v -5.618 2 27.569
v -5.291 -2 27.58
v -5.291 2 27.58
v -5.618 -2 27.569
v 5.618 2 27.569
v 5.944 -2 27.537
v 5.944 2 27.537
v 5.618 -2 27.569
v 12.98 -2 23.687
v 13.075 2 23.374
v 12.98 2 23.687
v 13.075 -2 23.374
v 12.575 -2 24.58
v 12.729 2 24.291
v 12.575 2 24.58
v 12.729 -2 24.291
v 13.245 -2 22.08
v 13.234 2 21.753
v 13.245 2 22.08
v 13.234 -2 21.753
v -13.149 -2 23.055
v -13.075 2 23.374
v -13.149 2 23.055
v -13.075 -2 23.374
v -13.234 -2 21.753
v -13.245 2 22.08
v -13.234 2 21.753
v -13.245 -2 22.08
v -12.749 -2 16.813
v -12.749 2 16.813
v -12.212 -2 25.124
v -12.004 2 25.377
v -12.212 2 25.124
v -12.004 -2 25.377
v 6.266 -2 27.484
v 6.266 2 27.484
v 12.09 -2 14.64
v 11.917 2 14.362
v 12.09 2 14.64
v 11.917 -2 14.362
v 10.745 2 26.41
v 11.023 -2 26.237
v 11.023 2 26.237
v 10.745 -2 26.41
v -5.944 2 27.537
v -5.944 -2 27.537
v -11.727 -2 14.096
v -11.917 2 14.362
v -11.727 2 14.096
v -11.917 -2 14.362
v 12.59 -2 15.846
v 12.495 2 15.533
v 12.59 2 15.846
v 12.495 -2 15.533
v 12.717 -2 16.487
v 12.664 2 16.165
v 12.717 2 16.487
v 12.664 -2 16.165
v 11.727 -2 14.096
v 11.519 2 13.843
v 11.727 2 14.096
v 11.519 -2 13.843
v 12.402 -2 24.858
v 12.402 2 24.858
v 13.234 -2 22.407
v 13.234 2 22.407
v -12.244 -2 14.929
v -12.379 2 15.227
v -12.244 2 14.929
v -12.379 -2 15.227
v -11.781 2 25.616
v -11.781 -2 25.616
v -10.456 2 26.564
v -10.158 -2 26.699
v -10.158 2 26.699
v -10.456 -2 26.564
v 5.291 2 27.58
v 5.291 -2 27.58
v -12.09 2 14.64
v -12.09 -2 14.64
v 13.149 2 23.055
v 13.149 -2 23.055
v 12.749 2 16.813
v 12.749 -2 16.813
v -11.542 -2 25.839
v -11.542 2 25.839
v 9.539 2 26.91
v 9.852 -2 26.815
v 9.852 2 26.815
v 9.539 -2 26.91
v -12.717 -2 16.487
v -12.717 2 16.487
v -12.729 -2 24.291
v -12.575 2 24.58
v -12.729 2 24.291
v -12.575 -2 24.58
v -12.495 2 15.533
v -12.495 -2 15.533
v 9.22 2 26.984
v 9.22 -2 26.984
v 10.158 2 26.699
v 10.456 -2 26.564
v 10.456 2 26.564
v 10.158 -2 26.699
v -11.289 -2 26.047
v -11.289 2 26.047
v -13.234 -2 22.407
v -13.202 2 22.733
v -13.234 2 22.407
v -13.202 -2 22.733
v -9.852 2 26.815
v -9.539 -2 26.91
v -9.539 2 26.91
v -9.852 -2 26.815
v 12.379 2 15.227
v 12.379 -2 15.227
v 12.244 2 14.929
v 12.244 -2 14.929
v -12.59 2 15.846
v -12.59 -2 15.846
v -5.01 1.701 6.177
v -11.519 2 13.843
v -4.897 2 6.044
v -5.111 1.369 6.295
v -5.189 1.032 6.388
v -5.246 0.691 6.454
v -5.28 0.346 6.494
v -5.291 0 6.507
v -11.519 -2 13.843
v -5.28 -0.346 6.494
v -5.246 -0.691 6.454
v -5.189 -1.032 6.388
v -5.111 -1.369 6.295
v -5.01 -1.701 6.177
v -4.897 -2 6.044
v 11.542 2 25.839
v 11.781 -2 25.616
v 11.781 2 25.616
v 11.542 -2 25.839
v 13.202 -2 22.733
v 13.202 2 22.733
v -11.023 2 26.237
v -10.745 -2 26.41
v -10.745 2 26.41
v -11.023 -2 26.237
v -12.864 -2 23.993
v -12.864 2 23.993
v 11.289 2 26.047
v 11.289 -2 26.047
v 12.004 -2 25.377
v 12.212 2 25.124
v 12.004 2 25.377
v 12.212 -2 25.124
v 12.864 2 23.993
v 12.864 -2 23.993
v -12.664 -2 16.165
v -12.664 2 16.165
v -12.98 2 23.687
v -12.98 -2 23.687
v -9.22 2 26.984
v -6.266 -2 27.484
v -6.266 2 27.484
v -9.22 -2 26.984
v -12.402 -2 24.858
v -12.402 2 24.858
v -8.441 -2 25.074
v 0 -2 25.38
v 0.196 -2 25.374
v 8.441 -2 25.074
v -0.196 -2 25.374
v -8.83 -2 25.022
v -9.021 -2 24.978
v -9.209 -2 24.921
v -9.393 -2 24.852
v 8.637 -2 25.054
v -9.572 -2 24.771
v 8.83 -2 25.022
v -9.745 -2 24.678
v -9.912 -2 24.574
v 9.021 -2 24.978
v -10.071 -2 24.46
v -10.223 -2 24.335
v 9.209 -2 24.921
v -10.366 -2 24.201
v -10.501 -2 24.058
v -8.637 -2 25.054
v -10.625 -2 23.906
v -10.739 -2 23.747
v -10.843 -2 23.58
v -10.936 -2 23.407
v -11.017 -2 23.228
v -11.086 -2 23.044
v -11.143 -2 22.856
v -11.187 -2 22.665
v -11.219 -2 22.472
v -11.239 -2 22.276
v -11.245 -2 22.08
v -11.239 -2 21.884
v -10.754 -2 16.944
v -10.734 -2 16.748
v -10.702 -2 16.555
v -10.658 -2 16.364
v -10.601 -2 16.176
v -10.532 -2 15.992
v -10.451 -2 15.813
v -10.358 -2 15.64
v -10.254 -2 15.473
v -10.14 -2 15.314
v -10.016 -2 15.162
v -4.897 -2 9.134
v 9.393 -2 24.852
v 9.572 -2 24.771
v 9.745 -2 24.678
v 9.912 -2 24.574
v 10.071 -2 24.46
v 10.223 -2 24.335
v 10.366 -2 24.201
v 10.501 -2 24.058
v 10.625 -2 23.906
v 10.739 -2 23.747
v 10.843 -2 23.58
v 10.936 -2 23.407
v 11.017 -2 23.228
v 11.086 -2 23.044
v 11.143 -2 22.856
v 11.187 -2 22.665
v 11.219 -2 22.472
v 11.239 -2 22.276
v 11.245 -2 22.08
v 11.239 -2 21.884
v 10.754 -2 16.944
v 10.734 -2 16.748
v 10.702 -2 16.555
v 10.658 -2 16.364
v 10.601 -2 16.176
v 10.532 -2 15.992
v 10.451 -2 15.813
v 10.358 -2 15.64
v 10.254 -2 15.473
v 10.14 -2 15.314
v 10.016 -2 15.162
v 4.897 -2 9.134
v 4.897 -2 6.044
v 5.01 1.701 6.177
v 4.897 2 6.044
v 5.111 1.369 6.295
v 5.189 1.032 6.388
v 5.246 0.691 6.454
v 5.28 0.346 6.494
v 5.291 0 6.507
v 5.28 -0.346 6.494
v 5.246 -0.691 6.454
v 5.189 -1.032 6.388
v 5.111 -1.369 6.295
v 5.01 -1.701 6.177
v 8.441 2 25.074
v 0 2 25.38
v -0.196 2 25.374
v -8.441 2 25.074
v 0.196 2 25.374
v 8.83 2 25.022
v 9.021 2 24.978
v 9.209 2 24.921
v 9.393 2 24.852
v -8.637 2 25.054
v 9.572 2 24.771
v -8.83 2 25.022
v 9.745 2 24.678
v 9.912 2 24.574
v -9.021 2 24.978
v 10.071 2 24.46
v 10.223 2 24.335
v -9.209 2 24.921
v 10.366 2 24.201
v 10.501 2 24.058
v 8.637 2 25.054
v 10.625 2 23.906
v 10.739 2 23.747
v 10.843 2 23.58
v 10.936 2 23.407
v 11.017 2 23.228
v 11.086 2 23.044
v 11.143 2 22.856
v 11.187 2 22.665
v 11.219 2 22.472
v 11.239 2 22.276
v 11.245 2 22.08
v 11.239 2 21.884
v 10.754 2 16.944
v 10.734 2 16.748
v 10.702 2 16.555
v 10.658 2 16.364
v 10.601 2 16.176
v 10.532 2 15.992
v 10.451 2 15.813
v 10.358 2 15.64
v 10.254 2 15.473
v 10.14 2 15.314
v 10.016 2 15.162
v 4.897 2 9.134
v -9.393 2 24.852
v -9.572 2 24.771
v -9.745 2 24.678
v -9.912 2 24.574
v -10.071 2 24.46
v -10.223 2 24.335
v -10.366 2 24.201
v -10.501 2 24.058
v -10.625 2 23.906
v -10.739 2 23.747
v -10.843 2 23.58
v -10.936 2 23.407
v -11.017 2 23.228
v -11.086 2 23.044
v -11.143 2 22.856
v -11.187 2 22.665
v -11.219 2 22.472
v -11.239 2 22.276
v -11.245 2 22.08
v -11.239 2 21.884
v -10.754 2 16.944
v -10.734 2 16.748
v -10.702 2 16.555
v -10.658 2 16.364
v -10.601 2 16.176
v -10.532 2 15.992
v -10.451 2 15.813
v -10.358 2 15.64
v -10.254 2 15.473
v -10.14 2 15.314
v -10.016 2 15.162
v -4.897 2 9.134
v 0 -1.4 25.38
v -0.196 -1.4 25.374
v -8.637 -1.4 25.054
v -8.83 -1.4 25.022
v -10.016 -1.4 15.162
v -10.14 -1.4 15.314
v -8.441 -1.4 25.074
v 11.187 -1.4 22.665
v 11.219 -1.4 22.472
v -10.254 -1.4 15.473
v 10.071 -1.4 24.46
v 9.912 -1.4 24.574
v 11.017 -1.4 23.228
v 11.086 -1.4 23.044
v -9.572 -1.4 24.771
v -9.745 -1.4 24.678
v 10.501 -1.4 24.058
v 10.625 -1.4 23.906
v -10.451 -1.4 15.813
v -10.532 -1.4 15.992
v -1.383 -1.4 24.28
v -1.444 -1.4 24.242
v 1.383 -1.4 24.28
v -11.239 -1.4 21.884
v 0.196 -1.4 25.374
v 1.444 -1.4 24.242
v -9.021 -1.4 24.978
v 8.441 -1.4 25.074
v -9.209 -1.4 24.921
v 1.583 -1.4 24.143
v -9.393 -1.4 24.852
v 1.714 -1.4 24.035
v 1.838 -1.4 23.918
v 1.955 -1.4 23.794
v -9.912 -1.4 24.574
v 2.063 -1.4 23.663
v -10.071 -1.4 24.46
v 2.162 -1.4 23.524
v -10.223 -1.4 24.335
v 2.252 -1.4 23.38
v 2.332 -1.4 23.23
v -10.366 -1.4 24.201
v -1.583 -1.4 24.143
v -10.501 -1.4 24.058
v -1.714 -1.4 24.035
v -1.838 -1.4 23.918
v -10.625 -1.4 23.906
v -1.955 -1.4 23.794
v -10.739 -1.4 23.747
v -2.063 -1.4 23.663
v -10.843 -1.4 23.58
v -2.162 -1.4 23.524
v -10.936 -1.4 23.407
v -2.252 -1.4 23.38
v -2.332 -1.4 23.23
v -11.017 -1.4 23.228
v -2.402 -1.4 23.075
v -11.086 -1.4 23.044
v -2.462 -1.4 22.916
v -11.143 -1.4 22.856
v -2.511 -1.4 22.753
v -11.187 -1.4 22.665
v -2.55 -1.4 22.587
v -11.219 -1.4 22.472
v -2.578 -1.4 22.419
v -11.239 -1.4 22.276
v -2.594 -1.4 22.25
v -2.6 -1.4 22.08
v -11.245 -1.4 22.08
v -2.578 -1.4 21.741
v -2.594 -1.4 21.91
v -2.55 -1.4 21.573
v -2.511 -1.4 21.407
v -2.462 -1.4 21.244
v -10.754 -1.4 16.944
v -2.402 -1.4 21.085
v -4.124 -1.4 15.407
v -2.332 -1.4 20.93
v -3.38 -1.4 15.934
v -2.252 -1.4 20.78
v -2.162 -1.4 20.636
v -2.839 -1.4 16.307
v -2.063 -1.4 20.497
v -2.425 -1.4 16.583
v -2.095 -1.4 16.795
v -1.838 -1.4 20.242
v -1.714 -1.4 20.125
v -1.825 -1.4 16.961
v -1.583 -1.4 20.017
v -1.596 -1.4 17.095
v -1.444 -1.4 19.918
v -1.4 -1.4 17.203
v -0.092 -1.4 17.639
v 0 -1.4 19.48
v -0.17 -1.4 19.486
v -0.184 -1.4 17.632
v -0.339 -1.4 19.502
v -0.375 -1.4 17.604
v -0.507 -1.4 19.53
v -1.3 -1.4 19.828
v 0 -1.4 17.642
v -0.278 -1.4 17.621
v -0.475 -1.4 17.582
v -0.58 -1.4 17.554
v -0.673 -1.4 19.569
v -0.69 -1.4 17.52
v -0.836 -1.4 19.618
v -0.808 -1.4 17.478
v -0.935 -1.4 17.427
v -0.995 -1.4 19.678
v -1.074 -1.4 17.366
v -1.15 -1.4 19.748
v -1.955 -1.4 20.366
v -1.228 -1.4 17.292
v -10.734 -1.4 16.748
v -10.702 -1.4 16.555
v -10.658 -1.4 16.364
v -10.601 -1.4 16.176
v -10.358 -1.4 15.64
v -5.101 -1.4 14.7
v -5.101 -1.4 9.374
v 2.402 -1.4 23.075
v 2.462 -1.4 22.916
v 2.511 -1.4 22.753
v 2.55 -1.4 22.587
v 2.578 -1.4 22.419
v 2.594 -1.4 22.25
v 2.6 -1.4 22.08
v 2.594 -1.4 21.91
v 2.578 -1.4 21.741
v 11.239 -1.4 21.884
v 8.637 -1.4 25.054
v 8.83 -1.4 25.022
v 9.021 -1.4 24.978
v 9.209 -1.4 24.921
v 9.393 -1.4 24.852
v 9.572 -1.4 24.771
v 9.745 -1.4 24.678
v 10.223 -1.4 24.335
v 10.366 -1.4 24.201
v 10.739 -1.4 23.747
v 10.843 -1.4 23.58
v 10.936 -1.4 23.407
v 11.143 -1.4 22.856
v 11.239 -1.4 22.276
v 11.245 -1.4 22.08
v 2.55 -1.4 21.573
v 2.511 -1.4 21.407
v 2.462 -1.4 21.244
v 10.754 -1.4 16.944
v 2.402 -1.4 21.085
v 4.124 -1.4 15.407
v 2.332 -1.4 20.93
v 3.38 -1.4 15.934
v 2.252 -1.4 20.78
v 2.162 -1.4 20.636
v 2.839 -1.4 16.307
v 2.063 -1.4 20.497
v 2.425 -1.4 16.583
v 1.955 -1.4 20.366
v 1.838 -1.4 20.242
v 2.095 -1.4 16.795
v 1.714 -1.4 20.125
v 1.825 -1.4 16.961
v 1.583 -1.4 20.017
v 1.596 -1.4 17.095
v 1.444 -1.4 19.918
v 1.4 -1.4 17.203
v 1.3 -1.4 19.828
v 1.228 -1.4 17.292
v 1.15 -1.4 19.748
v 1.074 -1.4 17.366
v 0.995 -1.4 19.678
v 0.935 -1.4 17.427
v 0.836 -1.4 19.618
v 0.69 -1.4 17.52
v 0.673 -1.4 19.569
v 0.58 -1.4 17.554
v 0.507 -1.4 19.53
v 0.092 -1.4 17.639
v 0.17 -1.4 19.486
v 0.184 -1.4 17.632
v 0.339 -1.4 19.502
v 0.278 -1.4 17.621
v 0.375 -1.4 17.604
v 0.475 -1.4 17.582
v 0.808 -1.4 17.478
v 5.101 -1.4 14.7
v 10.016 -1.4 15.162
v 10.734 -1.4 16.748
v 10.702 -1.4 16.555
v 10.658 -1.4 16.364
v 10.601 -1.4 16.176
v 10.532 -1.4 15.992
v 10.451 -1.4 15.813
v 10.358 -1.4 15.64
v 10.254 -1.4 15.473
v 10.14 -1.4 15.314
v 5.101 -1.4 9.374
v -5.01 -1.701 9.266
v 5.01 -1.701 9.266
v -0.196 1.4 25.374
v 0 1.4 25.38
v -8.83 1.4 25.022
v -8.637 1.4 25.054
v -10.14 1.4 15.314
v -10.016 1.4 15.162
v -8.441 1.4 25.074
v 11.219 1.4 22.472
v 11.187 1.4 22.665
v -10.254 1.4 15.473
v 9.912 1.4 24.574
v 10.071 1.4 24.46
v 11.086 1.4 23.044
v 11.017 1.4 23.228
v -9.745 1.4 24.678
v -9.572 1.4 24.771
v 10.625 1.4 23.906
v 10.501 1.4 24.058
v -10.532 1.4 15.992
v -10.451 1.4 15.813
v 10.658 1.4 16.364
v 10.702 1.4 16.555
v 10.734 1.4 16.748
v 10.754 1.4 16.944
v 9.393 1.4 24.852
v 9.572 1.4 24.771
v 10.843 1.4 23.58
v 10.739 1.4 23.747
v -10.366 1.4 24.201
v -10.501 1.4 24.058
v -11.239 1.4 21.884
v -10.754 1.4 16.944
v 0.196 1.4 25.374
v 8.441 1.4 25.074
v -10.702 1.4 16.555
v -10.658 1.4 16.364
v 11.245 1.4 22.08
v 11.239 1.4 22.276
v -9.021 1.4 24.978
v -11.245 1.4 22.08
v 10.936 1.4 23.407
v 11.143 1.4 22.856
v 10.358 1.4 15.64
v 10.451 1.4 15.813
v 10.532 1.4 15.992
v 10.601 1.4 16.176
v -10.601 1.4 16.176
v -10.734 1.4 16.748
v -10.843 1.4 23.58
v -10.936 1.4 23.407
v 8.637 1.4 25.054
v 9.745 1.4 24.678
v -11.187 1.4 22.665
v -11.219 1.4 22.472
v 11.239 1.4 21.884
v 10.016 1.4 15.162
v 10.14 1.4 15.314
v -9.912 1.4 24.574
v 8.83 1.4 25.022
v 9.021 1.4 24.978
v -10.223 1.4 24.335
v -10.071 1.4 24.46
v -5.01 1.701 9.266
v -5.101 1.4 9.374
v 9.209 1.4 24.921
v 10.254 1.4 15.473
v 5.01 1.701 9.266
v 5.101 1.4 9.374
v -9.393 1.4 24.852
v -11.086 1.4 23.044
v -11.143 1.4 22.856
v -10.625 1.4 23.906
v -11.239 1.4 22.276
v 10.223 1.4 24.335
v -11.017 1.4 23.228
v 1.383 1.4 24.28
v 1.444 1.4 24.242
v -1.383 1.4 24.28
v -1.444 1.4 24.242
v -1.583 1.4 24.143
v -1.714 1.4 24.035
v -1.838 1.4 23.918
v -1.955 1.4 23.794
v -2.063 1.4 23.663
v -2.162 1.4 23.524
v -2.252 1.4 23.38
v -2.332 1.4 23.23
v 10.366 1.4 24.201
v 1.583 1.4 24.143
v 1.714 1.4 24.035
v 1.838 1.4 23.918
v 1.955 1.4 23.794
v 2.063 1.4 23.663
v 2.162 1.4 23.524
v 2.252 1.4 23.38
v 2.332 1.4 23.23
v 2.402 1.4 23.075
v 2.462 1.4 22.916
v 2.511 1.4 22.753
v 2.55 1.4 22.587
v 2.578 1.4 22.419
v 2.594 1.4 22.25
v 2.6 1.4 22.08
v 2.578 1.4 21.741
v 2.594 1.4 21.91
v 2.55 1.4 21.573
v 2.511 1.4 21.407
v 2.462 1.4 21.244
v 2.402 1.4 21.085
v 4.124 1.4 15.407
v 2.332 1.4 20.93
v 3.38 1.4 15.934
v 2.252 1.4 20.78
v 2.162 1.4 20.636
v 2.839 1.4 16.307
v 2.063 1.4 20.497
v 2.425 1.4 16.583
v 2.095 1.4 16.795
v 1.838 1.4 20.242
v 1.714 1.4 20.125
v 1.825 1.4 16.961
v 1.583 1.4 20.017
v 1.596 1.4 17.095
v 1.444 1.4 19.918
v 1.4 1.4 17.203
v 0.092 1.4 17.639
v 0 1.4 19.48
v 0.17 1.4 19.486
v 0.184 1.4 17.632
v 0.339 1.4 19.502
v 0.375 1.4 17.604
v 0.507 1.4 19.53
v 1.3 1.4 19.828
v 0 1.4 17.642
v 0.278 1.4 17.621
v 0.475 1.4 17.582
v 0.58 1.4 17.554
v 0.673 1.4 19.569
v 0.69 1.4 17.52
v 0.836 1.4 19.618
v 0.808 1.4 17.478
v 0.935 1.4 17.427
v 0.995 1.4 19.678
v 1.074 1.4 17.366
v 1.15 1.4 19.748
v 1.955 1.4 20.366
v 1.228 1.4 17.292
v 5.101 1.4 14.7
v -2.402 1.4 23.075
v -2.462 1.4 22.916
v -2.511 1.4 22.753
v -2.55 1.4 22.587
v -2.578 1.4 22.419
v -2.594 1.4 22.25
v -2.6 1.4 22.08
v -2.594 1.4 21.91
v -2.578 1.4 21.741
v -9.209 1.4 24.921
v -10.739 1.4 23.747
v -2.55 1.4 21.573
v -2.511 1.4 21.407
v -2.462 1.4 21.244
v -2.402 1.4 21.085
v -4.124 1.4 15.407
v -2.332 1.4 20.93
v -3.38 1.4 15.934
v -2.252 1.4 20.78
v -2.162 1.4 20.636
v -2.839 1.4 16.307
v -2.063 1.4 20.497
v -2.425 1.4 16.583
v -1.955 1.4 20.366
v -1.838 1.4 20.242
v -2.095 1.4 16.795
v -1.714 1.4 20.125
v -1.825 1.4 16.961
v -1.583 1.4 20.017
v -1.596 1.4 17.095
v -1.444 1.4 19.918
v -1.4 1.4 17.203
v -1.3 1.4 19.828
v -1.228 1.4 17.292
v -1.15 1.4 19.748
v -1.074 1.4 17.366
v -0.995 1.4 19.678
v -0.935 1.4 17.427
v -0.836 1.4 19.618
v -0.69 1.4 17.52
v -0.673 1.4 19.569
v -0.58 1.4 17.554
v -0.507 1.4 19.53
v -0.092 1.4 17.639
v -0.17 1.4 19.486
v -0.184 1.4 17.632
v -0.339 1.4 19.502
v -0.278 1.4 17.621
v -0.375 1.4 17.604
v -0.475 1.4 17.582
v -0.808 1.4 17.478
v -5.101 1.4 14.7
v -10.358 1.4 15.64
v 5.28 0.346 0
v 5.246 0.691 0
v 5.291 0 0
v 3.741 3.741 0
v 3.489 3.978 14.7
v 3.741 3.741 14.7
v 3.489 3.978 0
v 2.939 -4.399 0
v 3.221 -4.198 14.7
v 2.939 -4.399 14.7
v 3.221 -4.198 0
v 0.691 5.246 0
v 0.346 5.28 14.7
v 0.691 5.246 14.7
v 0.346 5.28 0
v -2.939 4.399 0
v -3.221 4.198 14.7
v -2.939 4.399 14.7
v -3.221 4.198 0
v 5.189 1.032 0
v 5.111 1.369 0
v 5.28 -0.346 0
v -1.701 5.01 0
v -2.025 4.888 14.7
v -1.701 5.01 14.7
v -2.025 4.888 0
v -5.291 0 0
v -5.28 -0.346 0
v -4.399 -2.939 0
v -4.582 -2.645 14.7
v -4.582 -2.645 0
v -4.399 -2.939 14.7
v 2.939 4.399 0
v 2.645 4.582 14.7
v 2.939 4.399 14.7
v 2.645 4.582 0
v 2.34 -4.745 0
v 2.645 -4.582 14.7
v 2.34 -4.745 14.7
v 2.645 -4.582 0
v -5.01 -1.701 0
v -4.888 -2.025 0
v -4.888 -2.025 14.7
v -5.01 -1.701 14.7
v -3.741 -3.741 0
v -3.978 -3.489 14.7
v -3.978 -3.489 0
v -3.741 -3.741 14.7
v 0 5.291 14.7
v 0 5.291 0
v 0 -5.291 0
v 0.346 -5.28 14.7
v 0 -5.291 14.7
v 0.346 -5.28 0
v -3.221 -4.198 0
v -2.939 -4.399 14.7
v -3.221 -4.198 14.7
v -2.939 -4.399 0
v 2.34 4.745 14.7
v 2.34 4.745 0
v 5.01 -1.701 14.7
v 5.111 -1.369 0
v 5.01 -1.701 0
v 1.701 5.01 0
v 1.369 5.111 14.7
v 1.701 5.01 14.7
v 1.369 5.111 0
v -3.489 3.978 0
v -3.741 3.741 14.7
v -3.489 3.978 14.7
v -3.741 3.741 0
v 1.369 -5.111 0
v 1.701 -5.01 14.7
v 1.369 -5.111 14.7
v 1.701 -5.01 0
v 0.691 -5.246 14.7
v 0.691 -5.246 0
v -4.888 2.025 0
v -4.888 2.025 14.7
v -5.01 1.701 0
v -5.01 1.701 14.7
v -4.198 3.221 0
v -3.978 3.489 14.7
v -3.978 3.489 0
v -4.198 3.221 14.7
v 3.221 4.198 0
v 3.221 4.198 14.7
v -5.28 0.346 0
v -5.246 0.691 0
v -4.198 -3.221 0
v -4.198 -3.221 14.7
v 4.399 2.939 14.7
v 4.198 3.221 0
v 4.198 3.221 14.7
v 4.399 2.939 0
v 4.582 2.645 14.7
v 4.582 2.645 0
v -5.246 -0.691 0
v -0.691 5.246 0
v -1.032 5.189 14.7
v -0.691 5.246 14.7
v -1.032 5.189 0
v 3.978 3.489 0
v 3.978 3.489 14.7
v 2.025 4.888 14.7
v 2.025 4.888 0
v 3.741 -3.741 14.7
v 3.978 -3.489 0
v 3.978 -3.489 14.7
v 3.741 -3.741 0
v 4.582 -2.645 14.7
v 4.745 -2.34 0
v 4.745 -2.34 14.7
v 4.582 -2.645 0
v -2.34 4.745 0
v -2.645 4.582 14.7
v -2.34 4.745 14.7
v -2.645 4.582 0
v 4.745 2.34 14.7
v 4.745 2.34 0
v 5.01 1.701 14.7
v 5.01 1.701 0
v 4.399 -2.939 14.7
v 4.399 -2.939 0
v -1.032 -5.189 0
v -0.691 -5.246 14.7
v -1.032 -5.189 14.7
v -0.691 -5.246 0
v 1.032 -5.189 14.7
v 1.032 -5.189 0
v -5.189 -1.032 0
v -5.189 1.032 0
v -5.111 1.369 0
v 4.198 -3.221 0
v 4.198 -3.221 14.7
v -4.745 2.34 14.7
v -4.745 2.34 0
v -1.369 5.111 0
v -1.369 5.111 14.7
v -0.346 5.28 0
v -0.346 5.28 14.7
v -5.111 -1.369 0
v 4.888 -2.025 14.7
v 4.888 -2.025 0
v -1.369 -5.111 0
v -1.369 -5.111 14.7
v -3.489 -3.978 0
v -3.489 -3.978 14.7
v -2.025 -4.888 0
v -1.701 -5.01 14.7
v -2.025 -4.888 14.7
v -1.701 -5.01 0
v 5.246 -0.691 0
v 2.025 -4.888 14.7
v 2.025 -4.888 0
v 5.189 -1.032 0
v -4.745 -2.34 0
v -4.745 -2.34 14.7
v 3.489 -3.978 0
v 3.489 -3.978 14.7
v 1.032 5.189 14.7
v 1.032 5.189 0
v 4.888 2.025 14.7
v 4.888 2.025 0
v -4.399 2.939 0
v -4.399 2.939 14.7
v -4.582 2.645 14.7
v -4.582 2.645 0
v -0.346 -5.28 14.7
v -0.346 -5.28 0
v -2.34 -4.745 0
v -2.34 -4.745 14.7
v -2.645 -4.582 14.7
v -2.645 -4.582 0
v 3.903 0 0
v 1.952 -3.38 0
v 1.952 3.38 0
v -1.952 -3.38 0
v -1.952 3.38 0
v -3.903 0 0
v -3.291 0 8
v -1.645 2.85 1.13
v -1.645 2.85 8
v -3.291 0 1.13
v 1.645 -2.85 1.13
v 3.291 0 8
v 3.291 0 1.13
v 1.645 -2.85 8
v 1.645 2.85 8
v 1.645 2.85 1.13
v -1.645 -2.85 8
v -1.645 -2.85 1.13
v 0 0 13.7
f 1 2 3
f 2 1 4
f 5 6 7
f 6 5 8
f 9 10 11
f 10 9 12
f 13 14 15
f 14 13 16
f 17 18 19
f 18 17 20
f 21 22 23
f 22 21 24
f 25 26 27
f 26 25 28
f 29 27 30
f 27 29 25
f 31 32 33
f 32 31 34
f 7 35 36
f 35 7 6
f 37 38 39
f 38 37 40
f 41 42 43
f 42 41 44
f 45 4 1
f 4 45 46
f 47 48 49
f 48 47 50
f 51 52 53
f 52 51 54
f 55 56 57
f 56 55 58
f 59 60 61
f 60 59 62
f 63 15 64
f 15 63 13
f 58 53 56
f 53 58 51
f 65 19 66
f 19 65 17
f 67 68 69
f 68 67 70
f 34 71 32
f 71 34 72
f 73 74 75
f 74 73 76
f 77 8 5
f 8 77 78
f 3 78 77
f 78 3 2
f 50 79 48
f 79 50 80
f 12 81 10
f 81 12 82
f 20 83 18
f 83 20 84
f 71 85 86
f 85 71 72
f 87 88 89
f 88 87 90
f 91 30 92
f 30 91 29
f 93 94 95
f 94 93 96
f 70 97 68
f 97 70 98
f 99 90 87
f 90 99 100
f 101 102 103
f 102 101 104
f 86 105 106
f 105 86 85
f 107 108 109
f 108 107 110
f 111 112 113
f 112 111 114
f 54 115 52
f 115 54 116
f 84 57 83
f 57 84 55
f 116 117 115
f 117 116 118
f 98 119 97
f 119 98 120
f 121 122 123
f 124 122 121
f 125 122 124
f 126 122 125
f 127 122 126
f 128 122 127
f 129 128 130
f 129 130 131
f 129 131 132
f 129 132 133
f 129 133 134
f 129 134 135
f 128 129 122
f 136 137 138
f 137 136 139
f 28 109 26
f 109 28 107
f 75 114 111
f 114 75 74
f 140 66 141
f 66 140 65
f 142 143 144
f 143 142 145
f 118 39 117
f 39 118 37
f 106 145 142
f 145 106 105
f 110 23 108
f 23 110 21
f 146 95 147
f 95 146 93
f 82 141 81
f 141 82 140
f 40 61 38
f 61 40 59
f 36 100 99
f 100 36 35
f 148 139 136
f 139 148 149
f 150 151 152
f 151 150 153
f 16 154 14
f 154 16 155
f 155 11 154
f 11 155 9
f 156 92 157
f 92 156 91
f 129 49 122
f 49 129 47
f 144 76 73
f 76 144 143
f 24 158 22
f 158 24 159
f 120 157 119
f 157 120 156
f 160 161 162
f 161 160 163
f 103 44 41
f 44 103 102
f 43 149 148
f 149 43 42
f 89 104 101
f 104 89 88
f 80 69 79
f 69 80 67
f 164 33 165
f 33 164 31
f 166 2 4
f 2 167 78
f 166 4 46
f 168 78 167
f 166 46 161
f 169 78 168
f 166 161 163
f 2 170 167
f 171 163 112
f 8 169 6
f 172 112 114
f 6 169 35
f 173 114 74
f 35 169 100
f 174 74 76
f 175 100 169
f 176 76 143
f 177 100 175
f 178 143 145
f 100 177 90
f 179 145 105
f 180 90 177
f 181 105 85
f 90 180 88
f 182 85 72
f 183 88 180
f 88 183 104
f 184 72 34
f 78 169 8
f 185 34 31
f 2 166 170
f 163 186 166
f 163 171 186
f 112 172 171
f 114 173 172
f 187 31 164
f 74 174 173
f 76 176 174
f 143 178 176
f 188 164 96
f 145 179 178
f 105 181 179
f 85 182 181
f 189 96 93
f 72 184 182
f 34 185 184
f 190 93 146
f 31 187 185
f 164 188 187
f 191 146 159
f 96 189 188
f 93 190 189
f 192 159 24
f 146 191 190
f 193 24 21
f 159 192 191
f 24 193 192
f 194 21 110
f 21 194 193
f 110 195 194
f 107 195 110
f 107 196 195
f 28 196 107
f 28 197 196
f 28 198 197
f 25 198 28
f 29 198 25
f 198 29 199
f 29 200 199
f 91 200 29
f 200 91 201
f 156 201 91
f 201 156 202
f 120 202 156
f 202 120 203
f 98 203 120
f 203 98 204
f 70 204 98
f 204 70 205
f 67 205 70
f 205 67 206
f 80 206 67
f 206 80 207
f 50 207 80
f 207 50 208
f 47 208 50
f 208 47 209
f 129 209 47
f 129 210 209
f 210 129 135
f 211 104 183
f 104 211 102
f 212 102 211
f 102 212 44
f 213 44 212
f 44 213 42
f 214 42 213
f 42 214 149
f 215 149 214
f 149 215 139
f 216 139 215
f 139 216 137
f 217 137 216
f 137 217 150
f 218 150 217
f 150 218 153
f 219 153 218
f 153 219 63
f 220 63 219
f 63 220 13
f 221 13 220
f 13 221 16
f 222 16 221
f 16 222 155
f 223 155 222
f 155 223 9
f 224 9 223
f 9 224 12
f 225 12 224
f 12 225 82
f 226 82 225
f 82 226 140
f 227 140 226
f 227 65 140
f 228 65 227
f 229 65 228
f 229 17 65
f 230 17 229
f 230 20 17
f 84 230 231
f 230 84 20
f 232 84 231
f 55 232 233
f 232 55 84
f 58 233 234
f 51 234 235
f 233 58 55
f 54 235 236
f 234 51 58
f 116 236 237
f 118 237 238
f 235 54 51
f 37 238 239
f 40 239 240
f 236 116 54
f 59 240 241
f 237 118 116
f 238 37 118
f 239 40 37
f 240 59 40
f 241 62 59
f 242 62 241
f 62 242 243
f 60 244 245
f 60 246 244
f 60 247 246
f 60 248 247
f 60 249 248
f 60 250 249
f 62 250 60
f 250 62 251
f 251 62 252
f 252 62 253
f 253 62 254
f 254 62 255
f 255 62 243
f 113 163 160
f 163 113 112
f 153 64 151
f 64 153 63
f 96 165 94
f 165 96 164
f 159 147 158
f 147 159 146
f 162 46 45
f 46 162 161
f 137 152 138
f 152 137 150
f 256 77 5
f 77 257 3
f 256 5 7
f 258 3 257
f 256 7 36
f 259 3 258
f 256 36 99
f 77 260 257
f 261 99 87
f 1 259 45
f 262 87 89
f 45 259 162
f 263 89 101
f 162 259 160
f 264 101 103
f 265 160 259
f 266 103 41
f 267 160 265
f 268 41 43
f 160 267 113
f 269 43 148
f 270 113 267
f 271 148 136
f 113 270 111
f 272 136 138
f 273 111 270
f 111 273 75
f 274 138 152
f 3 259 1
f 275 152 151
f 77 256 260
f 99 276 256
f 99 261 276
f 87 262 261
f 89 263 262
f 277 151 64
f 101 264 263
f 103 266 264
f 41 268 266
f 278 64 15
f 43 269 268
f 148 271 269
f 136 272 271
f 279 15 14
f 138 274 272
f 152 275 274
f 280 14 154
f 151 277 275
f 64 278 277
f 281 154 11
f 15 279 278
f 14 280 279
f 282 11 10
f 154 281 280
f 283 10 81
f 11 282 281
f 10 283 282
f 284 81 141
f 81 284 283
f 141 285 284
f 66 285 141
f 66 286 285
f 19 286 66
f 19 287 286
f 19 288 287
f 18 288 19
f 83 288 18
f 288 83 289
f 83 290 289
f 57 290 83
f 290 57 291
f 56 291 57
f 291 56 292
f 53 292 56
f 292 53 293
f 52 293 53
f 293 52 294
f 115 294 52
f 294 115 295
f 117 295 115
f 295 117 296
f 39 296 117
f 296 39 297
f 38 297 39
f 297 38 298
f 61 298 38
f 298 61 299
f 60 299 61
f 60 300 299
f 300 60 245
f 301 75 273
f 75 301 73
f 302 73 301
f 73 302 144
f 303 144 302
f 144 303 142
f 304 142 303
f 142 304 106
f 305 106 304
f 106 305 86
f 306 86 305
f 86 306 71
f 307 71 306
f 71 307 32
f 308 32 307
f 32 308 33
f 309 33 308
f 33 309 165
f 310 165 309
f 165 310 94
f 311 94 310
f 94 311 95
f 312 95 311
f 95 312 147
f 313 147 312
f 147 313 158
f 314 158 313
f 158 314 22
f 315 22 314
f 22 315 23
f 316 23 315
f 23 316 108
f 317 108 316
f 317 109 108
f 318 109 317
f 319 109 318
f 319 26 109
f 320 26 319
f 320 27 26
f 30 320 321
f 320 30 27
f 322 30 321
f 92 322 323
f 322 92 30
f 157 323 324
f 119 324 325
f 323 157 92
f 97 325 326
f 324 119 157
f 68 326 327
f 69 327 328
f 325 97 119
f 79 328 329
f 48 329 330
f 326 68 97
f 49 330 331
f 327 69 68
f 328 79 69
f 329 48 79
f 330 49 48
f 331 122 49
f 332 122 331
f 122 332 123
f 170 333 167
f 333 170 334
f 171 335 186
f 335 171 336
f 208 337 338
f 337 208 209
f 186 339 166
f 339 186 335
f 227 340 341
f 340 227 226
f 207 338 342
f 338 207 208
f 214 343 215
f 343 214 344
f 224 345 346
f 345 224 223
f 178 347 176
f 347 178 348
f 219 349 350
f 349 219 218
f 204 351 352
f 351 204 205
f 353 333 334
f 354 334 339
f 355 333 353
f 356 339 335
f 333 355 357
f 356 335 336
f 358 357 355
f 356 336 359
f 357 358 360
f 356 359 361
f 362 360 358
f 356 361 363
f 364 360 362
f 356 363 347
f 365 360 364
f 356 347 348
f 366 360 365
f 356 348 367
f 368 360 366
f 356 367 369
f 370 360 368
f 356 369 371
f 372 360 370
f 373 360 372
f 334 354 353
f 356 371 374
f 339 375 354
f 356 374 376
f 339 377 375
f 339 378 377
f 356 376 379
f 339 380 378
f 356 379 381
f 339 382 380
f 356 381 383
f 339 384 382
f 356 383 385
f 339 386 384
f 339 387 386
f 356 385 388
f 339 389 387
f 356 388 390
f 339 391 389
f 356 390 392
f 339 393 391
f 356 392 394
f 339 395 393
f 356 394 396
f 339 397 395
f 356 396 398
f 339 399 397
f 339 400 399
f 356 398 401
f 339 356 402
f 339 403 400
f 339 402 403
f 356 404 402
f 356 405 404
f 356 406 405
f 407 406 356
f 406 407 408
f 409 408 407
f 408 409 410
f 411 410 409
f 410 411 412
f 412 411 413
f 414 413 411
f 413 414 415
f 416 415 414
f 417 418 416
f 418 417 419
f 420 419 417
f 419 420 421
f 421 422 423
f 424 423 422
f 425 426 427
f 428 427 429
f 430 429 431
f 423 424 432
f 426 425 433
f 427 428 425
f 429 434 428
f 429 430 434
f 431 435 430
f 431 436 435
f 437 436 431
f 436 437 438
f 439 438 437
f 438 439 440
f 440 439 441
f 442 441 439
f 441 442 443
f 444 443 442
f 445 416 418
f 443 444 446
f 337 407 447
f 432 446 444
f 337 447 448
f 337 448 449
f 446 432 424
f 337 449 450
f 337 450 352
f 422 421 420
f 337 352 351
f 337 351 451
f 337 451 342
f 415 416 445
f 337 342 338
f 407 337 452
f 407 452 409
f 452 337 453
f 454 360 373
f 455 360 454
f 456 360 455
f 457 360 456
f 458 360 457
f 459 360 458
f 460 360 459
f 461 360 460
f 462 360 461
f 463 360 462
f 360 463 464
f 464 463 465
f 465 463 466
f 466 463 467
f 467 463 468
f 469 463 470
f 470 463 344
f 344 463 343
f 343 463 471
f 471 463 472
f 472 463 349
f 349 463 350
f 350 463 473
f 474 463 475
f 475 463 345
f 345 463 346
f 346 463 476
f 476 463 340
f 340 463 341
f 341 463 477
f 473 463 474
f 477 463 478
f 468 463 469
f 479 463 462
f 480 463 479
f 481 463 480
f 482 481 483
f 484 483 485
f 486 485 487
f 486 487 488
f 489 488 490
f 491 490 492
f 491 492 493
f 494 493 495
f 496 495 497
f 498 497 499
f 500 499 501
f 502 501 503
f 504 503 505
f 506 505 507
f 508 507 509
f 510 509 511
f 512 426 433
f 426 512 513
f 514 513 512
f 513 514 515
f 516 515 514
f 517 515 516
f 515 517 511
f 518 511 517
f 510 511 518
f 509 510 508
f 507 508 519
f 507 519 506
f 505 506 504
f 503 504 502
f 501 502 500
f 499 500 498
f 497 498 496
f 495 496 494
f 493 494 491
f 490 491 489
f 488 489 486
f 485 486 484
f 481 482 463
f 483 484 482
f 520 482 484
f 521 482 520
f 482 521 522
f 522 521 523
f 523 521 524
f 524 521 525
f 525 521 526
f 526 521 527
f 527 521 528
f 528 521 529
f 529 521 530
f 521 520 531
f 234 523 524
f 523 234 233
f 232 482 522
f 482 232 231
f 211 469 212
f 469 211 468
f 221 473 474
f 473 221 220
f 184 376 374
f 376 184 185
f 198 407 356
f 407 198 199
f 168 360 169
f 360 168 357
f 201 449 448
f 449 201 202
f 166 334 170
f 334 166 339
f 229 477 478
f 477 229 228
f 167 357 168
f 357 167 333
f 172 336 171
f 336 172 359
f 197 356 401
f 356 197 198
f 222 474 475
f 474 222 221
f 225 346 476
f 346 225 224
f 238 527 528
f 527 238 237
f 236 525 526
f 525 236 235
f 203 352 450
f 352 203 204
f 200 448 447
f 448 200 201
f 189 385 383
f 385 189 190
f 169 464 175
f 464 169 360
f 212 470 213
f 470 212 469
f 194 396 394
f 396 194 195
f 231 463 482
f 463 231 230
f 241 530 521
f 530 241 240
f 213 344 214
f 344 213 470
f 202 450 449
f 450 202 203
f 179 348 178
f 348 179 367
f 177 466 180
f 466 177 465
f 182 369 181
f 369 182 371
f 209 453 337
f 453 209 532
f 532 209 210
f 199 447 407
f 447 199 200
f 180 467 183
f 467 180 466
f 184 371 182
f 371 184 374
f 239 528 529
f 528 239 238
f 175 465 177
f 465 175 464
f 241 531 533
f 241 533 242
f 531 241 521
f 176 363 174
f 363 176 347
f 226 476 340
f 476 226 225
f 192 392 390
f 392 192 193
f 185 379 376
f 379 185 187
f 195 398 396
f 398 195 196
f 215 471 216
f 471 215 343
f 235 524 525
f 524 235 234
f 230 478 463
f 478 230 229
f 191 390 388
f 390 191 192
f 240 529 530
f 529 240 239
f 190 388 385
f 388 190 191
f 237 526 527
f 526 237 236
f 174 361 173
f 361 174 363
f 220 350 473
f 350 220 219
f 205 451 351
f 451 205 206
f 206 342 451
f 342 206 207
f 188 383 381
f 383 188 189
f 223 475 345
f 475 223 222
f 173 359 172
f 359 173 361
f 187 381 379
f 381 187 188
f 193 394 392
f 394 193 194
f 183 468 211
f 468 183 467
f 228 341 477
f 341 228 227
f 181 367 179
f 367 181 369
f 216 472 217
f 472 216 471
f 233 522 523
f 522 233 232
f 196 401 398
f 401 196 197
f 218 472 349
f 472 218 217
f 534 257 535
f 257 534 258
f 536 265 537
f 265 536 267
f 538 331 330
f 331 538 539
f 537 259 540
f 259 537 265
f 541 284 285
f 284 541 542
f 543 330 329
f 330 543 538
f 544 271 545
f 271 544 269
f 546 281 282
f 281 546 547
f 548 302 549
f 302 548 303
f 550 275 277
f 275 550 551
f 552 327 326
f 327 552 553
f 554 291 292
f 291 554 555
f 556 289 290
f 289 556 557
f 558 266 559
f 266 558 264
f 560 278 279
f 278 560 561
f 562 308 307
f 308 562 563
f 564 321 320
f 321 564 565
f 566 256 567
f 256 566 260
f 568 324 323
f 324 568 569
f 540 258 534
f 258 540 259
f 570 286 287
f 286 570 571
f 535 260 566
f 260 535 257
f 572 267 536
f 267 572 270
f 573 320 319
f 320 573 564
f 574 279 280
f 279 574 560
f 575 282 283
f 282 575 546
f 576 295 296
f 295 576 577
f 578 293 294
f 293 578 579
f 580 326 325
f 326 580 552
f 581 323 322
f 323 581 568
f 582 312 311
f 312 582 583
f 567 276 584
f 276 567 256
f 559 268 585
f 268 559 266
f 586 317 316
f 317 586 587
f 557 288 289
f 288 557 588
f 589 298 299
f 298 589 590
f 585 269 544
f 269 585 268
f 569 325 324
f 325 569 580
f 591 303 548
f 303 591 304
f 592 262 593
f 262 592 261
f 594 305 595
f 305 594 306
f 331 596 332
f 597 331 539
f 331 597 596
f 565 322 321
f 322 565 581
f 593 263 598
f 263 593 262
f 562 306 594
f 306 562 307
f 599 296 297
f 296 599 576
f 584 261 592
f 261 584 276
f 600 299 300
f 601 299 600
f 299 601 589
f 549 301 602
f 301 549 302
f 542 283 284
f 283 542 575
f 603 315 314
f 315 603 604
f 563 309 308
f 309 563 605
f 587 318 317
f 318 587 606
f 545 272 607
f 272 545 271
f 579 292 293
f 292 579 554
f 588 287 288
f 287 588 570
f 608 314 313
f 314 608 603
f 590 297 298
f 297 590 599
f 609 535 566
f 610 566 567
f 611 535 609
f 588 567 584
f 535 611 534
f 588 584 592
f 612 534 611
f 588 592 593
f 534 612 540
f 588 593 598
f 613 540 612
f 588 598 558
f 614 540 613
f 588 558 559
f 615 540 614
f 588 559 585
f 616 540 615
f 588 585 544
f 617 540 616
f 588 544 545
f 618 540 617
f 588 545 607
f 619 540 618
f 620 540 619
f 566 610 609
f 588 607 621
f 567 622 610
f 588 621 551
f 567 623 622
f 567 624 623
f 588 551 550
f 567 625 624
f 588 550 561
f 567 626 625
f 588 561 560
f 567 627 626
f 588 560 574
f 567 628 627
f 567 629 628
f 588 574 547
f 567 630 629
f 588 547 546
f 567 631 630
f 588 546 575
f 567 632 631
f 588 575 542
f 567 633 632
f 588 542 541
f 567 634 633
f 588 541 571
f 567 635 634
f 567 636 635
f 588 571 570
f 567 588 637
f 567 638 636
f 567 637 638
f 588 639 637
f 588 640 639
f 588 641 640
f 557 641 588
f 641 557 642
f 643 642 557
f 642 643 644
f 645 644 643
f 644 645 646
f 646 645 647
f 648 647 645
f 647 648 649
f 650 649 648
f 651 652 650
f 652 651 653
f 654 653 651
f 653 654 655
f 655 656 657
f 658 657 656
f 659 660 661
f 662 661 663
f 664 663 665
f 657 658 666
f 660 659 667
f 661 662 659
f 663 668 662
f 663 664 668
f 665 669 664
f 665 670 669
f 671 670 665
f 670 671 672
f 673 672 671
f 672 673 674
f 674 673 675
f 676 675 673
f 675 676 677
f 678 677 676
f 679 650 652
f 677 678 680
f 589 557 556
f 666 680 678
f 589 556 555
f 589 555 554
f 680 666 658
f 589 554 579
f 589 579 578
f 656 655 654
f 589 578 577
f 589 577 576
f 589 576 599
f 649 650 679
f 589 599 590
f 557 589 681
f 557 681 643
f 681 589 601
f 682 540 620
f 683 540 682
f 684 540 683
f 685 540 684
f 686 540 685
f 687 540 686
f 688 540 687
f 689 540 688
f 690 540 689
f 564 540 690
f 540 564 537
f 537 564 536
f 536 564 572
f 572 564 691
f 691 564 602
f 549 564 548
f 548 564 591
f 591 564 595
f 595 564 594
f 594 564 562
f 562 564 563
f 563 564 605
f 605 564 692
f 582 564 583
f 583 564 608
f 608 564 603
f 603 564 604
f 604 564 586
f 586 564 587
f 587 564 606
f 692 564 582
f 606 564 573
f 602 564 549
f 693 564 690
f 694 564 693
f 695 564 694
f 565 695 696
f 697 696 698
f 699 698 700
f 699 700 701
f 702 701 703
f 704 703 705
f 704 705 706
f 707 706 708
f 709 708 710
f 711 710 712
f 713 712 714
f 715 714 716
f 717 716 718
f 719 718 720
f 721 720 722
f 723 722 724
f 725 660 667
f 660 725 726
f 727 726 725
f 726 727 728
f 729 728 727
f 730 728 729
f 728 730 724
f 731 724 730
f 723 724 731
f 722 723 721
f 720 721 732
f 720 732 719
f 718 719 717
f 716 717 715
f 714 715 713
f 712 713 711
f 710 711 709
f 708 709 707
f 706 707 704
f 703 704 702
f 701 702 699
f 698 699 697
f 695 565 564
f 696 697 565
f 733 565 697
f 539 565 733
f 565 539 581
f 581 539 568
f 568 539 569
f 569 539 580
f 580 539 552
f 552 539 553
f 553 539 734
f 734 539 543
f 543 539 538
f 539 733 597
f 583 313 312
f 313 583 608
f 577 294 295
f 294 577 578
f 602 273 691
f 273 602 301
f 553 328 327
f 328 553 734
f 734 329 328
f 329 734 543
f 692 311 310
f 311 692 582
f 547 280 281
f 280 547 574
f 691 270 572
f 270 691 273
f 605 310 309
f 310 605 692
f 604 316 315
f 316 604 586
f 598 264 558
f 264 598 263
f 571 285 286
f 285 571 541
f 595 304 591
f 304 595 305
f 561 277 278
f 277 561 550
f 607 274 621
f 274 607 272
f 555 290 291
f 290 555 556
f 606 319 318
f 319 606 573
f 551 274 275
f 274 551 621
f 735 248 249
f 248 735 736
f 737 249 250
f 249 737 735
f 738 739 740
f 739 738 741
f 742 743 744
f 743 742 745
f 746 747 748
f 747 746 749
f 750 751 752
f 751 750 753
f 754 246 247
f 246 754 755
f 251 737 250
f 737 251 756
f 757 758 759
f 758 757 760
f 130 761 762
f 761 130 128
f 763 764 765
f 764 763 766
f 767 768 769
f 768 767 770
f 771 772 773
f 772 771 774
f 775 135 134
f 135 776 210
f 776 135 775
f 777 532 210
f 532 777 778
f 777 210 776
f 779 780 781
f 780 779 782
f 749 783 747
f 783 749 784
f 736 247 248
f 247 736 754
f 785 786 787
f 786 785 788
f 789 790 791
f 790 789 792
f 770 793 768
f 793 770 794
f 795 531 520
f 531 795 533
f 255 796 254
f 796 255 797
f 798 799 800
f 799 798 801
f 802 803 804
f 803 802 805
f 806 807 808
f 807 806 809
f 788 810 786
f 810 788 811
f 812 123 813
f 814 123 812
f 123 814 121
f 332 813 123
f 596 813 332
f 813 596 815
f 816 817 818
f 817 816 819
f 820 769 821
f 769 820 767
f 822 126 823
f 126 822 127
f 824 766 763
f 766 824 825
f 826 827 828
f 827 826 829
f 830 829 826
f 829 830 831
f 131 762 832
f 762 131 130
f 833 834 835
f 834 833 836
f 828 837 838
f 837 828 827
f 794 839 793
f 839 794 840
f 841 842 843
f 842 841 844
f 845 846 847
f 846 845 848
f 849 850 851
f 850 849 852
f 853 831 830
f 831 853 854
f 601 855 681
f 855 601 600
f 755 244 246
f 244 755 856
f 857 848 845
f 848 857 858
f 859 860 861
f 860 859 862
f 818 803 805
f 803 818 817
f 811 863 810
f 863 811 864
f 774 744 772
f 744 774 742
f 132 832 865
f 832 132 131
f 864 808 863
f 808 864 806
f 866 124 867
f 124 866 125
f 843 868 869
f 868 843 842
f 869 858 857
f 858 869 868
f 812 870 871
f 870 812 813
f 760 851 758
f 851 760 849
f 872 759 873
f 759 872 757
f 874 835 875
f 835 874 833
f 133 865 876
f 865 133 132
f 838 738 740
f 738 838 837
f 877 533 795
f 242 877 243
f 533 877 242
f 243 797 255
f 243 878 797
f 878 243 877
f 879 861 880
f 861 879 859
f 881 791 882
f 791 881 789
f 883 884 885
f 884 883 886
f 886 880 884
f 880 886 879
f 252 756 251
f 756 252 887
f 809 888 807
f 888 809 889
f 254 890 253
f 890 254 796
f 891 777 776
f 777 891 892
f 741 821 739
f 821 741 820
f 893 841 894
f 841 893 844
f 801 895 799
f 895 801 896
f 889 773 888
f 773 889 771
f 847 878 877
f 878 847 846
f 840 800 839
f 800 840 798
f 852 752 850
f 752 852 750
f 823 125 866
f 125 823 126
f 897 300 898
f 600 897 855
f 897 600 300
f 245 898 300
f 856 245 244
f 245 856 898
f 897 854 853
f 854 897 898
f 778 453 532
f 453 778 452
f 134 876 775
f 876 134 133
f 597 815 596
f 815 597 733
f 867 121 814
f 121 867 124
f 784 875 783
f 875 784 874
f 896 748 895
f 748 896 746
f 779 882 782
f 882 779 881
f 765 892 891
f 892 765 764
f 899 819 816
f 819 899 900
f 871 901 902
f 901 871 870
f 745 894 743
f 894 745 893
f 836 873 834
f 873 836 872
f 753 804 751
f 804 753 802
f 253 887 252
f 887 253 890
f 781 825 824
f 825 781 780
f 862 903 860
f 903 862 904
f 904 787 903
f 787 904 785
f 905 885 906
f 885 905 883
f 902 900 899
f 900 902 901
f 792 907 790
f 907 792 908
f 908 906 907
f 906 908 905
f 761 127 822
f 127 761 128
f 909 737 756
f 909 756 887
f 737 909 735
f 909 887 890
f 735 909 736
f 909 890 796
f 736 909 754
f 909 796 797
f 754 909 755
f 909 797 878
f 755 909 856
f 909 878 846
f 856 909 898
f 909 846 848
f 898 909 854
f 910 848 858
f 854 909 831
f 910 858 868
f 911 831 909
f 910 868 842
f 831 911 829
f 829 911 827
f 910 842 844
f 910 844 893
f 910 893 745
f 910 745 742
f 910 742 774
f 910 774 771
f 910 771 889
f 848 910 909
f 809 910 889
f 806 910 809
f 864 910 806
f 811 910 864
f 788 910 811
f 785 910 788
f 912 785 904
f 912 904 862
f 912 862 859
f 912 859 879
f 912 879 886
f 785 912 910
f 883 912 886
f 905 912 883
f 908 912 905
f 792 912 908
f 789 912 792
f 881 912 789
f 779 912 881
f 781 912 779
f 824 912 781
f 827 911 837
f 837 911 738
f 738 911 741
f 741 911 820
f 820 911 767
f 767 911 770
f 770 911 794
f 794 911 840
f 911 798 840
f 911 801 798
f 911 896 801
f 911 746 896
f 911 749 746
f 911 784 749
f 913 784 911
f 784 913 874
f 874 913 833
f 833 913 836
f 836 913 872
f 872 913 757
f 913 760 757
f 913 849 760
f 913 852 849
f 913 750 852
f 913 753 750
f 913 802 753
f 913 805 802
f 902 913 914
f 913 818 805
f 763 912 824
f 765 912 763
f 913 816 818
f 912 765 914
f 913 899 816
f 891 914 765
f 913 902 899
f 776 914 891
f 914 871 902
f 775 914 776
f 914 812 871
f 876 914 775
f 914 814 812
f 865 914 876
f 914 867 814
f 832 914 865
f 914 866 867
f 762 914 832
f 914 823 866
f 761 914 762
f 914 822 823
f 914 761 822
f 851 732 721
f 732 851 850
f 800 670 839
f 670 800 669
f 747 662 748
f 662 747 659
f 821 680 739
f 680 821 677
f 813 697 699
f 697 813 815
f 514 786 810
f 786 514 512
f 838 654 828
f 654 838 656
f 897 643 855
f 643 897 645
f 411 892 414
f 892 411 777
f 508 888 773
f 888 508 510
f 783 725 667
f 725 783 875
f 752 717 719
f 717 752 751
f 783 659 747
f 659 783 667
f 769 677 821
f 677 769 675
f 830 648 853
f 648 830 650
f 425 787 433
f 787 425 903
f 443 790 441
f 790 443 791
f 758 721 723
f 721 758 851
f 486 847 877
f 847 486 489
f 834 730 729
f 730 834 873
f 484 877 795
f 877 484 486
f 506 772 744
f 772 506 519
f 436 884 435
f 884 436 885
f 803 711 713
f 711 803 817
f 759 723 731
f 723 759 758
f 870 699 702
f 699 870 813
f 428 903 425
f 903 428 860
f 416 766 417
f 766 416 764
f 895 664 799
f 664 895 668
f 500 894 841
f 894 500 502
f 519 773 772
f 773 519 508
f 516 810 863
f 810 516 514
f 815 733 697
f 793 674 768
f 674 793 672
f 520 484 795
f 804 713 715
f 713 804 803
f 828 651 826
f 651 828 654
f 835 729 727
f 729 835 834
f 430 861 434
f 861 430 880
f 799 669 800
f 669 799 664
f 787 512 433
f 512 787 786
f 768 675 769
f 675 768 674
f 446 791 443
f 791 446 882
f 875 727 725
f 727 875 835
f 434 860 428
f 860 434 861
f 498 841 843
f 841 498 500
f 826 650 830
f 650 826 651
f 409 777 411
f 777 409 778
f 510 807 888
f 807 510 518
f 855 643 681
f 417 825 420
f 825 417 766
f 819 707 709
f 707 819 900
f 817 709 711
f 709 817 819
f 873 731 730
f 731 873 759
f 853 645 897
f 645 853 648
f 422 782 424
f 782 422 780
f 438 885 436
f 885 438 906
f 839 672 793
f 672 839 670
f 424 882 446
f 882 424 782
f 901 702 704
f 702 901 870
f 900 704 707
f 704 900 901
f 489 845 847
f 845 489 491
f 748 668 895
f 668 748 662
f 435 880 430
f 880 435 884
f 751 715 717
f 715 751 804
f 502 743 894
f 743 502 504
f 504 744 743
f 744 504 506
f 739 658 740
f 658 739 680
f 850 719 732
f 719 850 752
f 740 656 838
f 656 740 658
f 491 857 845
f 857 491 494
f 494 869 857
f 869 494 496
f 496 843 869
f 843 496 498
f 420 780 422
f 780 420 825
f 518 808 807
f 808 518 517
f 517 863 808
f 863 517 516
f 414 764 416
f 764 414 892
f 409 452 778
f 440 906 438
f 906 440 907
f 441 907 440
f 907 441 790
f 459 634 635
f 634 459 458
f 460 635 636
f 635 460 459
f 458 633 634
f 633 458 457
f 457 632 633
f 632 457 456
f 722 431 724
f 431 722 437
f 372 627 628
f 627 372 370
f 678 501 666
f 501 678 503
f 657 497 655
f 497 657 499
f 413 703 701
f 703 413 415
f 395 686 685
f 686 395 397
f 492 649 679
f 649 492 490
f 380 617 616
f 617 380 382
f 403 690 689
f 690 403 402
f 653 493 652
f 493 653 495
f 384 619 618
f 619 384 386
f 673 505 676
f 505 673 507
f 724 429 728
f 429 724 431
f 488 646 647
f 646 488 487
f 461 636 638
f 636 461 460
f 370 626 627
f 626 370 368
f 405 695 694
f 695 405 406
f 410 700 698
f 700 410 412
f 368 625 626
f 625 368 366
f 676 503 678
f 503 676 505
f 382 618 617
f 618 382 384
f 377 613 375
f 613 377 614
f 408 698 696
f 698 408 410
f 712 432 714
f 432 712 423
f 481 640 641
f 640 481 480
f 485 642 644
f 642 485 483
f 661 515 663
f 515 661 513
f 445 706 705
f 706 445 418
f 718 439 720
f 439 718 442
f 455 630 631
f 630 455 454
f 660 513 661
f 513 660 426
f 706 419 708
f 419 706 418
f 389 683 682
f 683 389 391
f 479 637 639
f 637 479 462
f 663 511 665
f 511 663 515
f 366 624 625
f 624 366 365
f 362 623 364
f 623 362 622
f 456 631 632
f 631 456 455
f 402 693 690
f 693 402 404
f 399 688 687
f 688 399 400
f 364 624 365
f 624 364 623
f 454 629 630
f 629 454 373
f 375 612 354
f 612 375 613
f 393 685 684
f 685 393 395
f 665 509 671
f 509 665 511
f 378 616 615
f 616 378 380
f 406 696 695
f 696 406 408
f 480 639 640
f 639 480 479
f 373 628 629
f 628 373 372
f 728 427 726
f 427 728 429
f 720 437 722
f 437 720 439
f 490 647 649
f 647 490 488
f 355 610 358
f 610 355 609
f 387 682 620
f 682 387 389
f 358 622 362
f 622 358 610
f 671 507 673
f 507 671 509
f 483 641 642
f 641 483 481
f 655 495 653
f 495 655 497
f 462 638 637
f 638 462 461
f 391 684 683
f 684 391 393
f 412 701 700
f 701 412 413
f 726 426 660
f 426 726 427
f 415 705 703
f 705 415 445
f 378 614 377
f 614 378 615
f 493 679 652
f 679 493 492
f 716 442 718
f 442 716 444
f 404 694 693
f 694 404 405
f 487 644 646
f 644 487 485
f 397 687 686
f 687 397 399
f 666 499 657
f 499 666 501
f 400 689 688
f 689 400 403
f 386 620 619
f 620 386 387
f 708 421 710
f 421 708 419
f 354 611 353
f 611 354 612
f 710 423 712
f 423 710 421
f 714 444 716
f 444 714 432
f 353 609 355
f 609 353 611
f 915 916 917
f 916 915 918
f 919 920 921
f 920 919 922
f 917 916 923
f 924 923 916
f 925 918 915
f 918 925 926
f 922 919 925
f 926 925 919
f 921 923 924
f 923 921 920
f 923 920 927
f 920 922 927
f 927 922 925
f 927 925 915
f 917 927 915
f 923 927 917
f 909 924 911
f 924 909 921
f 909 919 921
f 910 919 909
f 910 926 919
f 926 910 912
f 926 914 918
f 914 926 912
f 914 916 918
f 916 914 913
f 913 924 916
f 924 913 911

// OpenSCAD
//  - The number of sides.
hole_sides = 6; // [3:12]

//  - For an even number of sides, this is the perpendicular distance between two opposite, parallel sides. For an odd number of sides, this is the perpendicular distance from the middle of one side to the opposite corner.
hole_diameter = 5.7;

//  - The depth of the hole.
hole_depth = 8; // 4+

//  - Do you need a hole in the handle?
string_hole = 1;//[0:No, 1:Yes]

//  - Minimal outer diameter - use this to make the `trunk' of the key thicker.
min_outer_diameter = 0;

//  - Do you need to add a foot/brim to increase adhesion during printing?
add_foot = 0;//[0:No, 1:Yes]

//  - Which handle style? Numbers 2 & 3 don't look right in Customiser, but render fine!
handle = 1;//[1,2,3]


hole_height = hole_depth + hole_diameter;
w = hole_diameter/2+2;
h = hole_height + 1;

difference()
{
  union()
  {
    cyl_rad_min = diam2rad(hole_diameter, hole_sides) + 2;
    cyl_rad = max(cyl_rad_min, min_outer_diameter/2);
    
   // cyl_top = handle == 2 ? max(1, hole_depth / 6) : 0;
    cyl_top = handle == 1 ? 0 : (handle == 2 ? max(1, hole_depth / 6) : max(0.5, hole_depth / 8));
    cylinder(hole_height + 1, cyl_rad, cyl_rad+cyl_top, $fn = 96);
    
    if(add_foot)
      feet(cyl_rad);
    
    translate([0, 0, hole_height+1])
    if(handle == 1)
      cylinder(4, cyl_rad+cyl_top, 0, $fn = 96);
    else
      cylinder(2, cyl_rad+cyl_top, 0, $fn = 96);
    
    handle_thickness = min(10, max(4, hole_diameter/4+2));

    if(handle == 1)
      handle1(handle_thickness, cyl_rad);
    else if(handle == 2)
      handle2(handle_thickness, cyl_rad);
    else if(handle == 3)
      handle3(handle_thickness, cyl_rad);
  }

  if(string_hole)
    translate([0, 0, handle!=3?1.4*h+1.5:1.2*h+1.0])
      rotate([90])
        difference()
        {
          cylinder(11, 2.6, 2.6, true, $fn = 96);
          translate([0, 2.4, 0])
            cube([5.2, 0.4, 12], true);
        }

  nPrism(hole_sides, hole_diameter, hole_depth);
}


module nPrism(sides, diam, ln)
{
  l  = diam2rad(diam, sides);
  l2 = diam2rad(diam + 2, sides);
  
  linear_extrude(height = ln)
    polygon(points=[for(i=[0:(360/sides):360]) l*[cos(i), sin(i)]]);

  translate([0,0,ln])
    linear_extrude(height = diam, scale = 0)
      polygon(points=[for(i=[0:(360/sides):360]) l*[cos(i), sin(i)]]);

  translate([0,0,-1])
    linear_extrude(height = diam+2.5, scale = 0)
      polygon(points=[for(i=[0:(360/sides):360]) l2*[cos(i), sin(i)]]);
}

module feet(rad)
{
  difference()
  {
    union()
    {
      difference()
      {
        cylinder(0.4, rad+6, rad+6, $fn = 48);
        cylinder(1, rad+1, rad+1, $fn = 48, true);
      }
      
      cnt=(3.141592*rad)/4;
      for(i = [0:(180/cnt):180])
        rotate([0, 0, i])
          translate([-rad-2, -0.5, 0])
            cube([2*rad+4, 1, 0.4]);
    }
  
    cylinder(1, rad-0.1, rad-0.1, $fn = 48, true);
  }
}

module handle1(thickness, cyl_rad)
{
  rotate([90])
    difference()
    {
      linear_extrude(height = thickness, center=true)
        minkowski()
        {
          polygon(points = [[0, hole_depth], [w*1.6, 1.2*h-0.5], [w*1.7, 1.4*h+1.5],[cyl_rad, 1.4*h+2.0], [-cyl_rad, 1.4*h+2.0], [-w*1.7, 1.4*h+1.5], [-w*1.6, 1.2*h-0.5], [0, hole_depth]]);
          circle(min(5, hole_depth), $fn=96);
        }

      translate([0, 0, thickness/2])
      linear_extrude(height = 1.2, center=true)
        minkowski()
        {
          polygon(points = [[0, hole_depth], [w*1.6, 1.2*h-0.5], [w*1.7, 1.4*h+1.5],[0, 1.4*h+1.8], [-w*1.7, 1.4*h+1.5], [-w*1.6, 1.2*h-0.5], [0, hole_depth]]);
          circle(min(5, hole_depth)-2, $fn=96);
        }
        
      translate([0, 0, -thickness/2])
      linear_extrude(height = 1.2, center=true)
        minkowski()
        {
          polygon(points = [[0, hole_depth], [w*1.6, 1.2*h-0.5], [w*1.7, 1.4*h+1.5],[0, 1.4*h+1.8], [-w*1.7, 1.4*h+1.5], [-w*1.6, 1.2*h-0.5], [0, hole_depth]]);
          circle(min(5, hole_depth)-2, $fn=96);
        }
     }
 }


module handle2(thickness, cyl_rad)
{
  rotate([90])
  intersection()
  {
    rotate_extrude(angle=190, $fn = 96)
      rotate([0,0,90])
        difference()
        {
          union()
          {
           polygon(points = [[-thickness/2+1, 0], [thickness/2-1, 0], 
                             [ thickness/2, 1.4*h+1.8+4],
                             [-thickness/2, 1.4*h+1.8+4]]);
           translate([0, 1.4*h+1.8+4])
             circle(thickness/2+0.0, $fn = 96*2);
          }
        }
        
    linear_extrude(height = thickness+2, center=true)
    {
      polygon(points = [[-cyl_rad+0.5, 0],[cyl_rad-0.5, 0],
                     [ 1.5*h+1, 2.8*h+4],
                     [-1.5*h-1, 2.8*h+4]]);
    }
  }
}
 

module handle3(thickness, cyl_rad)
{
  wid = w*1.7*2+min(5, hole_depth) - thickness/2;
  rd = wid*3;
  ht = 1.4*h+7.0;
  r = (w*1.7*2 + min(5, hole_depth)) / 2;
  l = r*r/ht;
  
  difference()
  {
    translate([0, 0, 1.2*h+1-l])
    {
      rotate([180])
        linear_extrude(height = ht-l, scale = 0)
          projection(cut = true)
            translate([0, 0, l])
              rotate([90])
                shape3D(thickness, cyl_rad);
                  
      difference()
      {
        translate([0, 0, l])
          rotate([90])
            shape3D(thickness, cyl_rad);
        
        translate([-(wid+thickness+1)/2, -(thickness+1)/2, -wid])
          cube([wid+thickness+1, thickness+1, wid]);
      }
    }
    translate([0, 0, -ht/2])
      cube([wid, cyl_rad*2, ht], true);
  }
}

module shape3D(thickness, cyl_rad)
{
  wid = w*1.7*2+min(5, hole_depth) - thickness/2;
  rd = wid*3;
  
  rotate_extrude($fn = 96*2)
    difference()
    {
      union()
      {
        square([wid, thickness], true);
        //translate([wid/2, 0])
          //circle(thickness/2, $fn = 96);
        translate([-wid/2, 0])
          circle(thickness/2, $fn = 96);
      }
        
      translate([0, sqrt(rd*rd - wid*wid/4)+thickness/2])
        circle(rd, $fs = 0.5, $fa = 0.1);
      translate([0, -sqrt(rd*rd - wid*wid/4)-thickness/2])
        circle(rd, $fs = 0.5, $fa = 0.1);

      translate([0, -thickness/2])
        square([wid, thickness]);
    }
}

function diam2rad(diam, sides) = isOdd(sides) ? diam/(1 + cos(180/sides)) : diam/ (cos(180/sides) * 2);
function isOdd(t) = (t-(floor(t/2)*2));
